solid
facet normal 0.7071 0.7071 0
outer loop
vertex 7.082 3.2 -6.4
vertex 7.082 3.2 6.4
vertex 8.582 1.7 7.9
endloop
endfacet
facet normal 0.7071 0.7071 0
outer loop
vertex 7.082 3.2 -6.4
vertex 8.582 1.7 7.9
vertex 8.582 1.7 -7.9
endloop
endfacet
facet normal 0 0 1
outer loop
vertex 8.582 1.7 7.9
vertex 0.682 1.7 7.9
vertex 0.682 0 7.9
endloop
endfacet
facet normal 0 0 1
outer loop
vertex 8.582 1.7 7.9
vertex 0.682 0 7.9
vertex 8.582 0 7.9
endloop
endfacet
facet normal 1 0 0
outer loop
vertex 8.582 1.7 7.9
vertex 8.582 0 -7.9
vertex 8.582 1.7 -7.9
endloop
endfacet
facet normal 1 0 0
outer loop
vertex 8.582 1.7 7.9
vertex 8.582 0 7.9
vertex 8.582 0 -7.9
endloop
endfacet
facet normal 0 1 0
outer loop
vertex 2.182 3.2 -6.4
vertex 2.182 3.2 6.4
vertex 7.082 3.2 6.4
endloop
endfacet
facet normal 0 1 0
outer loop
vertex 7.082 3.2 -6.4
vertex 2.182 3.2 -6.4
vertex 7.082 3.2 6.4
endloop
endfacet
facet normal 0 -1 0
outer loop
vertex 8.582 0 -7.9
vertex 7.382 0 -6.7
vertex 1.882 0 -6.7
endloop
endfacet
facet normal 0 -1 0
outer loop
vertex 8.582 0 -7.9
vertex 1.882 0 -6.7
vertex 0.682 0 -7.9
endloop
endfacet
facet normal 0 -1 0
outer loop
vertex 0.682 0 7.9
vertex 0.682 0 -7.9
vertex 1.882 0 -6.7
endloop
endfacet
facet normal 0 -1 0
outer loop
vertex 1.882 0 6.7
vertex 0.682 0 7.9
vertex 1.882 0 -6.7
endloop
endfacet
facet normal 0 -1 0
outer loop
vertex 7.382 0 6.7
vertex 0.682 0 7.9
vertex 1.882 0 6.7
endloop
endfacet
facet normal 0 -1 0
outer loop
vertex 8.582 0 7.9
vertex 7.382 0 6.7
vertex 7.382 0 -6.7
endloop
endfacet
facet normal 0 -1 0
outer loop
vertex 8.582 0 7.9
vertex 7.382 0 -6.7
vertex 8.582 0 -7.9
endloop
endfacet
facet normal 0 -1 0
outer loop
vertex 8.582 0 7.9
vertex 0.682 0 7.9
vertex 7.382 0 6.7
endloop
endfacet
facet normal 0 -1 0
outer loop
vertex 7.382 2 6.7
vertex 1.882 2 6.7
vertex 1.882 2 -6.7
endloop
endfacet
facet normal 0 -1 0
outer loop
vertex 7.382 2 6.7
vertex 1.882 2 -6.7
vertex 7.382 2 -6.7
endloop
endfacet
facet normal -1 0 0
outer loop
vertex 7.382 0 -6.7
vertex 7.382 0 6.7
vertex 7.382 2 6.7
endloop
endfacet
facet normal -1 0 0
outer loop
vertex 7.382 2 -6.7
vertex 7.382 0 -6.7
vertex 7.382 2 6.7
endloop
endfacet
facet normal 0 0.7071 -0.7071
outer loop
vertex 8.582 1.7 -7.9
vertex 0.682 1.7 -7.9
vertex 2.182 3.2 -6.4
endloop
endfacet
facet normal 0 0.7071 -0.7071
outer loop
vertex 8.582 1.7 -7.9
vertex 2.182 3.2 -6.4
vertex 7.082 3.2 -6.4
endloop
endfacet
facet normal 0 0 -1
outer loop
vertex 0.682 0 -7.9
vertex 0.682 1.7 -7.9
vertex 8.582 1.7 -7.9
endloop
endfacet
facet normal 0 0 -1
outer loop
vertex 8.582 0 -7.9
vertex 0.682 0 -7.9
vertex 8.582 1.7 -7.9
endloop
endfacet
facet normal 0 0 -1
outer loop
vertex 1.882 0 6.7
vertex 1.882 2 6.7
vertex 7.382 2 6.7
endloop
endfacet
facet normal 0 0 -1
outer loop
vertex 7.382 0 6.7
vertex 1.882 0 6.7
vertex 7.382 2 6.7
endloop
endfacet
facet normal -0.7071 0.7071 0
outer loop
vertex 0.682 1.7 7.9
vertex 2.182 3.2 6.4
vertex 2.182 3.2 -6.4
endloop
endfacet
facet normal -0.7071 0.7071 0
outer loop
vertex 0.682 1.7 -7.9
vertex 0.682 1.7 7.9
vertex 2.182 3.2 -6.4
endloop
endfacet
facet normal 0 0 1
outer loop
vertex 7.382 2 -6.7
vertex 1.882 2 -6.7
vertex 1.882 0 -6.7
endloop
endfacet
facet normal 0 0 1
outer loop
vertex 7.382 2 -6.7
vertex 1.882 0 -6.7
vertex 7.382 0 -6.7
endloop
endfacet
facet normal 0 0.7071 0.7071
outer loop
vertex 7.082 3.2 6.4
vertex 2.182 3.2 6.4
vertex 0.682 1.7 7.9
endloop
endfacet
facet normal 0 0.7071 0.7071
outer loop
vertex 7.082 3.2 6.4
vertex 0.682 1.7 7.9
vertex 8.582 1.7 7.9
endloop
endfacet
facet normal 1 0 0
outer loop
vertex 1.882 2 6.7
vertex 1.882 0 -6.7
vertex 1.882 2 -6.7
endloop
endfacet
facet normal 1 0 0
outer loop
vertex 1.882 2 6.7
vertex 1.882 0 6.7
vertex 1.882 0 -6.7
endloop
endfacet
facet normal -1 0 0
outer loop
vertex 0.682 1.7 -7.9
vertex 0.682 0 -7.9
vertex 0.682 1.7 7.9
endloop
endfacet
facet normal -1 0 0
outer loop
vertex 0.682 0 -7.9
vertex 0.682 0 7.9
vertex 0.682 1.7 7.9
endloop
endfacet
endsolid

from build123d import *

# Parameters (mm, degrees)
MAINBASESKETCH_W      = 7.9
MAINBASESKETCH_H      = 3.2
MAINBASEEXTRUDE_DEPTH = 7.9
MAINBASESHELL_T       = -1.2
CHAMFER1_SIZE         = 1.5


with BuildPart() as part:
    # MainBaseSketch → MainBaseExtrude (new, symmetric)
    with BuildSketch(Plane.XY):
        with Locations((4.631967213, 1.6)):
            Rectangle(MAINBASESKETCH_W, MAINBASESKETCH_H)
    extrude(amount=MAINBASEEXTRUDE_DEPTH, both=True)

    # MainBaseShell
    mainbaseshell_openings = [part.faces().sort_by_distance(p)[0] for p in [
        (4.631967213, 0, 0),
    ]]
    offset(amount=MAINBASESHELL_T, openings=mainbaseshell_openings, kind=Kind.INTERSECTION)

    # Chamfer1
    chamfer1_edges = [part.edges().sort_by_distance(p)[0] for p in [
        (4.631967213, 3.2, 7.9),
        (4.631967213, 3.2, -7.9),
        (0.681967213, 3.2, 0),
        (8.581967213, 3.2, 0),
    ]]
    chamfer(chamfer1_edges, length=CHAMFER1_SIZE)


solid = part.part
